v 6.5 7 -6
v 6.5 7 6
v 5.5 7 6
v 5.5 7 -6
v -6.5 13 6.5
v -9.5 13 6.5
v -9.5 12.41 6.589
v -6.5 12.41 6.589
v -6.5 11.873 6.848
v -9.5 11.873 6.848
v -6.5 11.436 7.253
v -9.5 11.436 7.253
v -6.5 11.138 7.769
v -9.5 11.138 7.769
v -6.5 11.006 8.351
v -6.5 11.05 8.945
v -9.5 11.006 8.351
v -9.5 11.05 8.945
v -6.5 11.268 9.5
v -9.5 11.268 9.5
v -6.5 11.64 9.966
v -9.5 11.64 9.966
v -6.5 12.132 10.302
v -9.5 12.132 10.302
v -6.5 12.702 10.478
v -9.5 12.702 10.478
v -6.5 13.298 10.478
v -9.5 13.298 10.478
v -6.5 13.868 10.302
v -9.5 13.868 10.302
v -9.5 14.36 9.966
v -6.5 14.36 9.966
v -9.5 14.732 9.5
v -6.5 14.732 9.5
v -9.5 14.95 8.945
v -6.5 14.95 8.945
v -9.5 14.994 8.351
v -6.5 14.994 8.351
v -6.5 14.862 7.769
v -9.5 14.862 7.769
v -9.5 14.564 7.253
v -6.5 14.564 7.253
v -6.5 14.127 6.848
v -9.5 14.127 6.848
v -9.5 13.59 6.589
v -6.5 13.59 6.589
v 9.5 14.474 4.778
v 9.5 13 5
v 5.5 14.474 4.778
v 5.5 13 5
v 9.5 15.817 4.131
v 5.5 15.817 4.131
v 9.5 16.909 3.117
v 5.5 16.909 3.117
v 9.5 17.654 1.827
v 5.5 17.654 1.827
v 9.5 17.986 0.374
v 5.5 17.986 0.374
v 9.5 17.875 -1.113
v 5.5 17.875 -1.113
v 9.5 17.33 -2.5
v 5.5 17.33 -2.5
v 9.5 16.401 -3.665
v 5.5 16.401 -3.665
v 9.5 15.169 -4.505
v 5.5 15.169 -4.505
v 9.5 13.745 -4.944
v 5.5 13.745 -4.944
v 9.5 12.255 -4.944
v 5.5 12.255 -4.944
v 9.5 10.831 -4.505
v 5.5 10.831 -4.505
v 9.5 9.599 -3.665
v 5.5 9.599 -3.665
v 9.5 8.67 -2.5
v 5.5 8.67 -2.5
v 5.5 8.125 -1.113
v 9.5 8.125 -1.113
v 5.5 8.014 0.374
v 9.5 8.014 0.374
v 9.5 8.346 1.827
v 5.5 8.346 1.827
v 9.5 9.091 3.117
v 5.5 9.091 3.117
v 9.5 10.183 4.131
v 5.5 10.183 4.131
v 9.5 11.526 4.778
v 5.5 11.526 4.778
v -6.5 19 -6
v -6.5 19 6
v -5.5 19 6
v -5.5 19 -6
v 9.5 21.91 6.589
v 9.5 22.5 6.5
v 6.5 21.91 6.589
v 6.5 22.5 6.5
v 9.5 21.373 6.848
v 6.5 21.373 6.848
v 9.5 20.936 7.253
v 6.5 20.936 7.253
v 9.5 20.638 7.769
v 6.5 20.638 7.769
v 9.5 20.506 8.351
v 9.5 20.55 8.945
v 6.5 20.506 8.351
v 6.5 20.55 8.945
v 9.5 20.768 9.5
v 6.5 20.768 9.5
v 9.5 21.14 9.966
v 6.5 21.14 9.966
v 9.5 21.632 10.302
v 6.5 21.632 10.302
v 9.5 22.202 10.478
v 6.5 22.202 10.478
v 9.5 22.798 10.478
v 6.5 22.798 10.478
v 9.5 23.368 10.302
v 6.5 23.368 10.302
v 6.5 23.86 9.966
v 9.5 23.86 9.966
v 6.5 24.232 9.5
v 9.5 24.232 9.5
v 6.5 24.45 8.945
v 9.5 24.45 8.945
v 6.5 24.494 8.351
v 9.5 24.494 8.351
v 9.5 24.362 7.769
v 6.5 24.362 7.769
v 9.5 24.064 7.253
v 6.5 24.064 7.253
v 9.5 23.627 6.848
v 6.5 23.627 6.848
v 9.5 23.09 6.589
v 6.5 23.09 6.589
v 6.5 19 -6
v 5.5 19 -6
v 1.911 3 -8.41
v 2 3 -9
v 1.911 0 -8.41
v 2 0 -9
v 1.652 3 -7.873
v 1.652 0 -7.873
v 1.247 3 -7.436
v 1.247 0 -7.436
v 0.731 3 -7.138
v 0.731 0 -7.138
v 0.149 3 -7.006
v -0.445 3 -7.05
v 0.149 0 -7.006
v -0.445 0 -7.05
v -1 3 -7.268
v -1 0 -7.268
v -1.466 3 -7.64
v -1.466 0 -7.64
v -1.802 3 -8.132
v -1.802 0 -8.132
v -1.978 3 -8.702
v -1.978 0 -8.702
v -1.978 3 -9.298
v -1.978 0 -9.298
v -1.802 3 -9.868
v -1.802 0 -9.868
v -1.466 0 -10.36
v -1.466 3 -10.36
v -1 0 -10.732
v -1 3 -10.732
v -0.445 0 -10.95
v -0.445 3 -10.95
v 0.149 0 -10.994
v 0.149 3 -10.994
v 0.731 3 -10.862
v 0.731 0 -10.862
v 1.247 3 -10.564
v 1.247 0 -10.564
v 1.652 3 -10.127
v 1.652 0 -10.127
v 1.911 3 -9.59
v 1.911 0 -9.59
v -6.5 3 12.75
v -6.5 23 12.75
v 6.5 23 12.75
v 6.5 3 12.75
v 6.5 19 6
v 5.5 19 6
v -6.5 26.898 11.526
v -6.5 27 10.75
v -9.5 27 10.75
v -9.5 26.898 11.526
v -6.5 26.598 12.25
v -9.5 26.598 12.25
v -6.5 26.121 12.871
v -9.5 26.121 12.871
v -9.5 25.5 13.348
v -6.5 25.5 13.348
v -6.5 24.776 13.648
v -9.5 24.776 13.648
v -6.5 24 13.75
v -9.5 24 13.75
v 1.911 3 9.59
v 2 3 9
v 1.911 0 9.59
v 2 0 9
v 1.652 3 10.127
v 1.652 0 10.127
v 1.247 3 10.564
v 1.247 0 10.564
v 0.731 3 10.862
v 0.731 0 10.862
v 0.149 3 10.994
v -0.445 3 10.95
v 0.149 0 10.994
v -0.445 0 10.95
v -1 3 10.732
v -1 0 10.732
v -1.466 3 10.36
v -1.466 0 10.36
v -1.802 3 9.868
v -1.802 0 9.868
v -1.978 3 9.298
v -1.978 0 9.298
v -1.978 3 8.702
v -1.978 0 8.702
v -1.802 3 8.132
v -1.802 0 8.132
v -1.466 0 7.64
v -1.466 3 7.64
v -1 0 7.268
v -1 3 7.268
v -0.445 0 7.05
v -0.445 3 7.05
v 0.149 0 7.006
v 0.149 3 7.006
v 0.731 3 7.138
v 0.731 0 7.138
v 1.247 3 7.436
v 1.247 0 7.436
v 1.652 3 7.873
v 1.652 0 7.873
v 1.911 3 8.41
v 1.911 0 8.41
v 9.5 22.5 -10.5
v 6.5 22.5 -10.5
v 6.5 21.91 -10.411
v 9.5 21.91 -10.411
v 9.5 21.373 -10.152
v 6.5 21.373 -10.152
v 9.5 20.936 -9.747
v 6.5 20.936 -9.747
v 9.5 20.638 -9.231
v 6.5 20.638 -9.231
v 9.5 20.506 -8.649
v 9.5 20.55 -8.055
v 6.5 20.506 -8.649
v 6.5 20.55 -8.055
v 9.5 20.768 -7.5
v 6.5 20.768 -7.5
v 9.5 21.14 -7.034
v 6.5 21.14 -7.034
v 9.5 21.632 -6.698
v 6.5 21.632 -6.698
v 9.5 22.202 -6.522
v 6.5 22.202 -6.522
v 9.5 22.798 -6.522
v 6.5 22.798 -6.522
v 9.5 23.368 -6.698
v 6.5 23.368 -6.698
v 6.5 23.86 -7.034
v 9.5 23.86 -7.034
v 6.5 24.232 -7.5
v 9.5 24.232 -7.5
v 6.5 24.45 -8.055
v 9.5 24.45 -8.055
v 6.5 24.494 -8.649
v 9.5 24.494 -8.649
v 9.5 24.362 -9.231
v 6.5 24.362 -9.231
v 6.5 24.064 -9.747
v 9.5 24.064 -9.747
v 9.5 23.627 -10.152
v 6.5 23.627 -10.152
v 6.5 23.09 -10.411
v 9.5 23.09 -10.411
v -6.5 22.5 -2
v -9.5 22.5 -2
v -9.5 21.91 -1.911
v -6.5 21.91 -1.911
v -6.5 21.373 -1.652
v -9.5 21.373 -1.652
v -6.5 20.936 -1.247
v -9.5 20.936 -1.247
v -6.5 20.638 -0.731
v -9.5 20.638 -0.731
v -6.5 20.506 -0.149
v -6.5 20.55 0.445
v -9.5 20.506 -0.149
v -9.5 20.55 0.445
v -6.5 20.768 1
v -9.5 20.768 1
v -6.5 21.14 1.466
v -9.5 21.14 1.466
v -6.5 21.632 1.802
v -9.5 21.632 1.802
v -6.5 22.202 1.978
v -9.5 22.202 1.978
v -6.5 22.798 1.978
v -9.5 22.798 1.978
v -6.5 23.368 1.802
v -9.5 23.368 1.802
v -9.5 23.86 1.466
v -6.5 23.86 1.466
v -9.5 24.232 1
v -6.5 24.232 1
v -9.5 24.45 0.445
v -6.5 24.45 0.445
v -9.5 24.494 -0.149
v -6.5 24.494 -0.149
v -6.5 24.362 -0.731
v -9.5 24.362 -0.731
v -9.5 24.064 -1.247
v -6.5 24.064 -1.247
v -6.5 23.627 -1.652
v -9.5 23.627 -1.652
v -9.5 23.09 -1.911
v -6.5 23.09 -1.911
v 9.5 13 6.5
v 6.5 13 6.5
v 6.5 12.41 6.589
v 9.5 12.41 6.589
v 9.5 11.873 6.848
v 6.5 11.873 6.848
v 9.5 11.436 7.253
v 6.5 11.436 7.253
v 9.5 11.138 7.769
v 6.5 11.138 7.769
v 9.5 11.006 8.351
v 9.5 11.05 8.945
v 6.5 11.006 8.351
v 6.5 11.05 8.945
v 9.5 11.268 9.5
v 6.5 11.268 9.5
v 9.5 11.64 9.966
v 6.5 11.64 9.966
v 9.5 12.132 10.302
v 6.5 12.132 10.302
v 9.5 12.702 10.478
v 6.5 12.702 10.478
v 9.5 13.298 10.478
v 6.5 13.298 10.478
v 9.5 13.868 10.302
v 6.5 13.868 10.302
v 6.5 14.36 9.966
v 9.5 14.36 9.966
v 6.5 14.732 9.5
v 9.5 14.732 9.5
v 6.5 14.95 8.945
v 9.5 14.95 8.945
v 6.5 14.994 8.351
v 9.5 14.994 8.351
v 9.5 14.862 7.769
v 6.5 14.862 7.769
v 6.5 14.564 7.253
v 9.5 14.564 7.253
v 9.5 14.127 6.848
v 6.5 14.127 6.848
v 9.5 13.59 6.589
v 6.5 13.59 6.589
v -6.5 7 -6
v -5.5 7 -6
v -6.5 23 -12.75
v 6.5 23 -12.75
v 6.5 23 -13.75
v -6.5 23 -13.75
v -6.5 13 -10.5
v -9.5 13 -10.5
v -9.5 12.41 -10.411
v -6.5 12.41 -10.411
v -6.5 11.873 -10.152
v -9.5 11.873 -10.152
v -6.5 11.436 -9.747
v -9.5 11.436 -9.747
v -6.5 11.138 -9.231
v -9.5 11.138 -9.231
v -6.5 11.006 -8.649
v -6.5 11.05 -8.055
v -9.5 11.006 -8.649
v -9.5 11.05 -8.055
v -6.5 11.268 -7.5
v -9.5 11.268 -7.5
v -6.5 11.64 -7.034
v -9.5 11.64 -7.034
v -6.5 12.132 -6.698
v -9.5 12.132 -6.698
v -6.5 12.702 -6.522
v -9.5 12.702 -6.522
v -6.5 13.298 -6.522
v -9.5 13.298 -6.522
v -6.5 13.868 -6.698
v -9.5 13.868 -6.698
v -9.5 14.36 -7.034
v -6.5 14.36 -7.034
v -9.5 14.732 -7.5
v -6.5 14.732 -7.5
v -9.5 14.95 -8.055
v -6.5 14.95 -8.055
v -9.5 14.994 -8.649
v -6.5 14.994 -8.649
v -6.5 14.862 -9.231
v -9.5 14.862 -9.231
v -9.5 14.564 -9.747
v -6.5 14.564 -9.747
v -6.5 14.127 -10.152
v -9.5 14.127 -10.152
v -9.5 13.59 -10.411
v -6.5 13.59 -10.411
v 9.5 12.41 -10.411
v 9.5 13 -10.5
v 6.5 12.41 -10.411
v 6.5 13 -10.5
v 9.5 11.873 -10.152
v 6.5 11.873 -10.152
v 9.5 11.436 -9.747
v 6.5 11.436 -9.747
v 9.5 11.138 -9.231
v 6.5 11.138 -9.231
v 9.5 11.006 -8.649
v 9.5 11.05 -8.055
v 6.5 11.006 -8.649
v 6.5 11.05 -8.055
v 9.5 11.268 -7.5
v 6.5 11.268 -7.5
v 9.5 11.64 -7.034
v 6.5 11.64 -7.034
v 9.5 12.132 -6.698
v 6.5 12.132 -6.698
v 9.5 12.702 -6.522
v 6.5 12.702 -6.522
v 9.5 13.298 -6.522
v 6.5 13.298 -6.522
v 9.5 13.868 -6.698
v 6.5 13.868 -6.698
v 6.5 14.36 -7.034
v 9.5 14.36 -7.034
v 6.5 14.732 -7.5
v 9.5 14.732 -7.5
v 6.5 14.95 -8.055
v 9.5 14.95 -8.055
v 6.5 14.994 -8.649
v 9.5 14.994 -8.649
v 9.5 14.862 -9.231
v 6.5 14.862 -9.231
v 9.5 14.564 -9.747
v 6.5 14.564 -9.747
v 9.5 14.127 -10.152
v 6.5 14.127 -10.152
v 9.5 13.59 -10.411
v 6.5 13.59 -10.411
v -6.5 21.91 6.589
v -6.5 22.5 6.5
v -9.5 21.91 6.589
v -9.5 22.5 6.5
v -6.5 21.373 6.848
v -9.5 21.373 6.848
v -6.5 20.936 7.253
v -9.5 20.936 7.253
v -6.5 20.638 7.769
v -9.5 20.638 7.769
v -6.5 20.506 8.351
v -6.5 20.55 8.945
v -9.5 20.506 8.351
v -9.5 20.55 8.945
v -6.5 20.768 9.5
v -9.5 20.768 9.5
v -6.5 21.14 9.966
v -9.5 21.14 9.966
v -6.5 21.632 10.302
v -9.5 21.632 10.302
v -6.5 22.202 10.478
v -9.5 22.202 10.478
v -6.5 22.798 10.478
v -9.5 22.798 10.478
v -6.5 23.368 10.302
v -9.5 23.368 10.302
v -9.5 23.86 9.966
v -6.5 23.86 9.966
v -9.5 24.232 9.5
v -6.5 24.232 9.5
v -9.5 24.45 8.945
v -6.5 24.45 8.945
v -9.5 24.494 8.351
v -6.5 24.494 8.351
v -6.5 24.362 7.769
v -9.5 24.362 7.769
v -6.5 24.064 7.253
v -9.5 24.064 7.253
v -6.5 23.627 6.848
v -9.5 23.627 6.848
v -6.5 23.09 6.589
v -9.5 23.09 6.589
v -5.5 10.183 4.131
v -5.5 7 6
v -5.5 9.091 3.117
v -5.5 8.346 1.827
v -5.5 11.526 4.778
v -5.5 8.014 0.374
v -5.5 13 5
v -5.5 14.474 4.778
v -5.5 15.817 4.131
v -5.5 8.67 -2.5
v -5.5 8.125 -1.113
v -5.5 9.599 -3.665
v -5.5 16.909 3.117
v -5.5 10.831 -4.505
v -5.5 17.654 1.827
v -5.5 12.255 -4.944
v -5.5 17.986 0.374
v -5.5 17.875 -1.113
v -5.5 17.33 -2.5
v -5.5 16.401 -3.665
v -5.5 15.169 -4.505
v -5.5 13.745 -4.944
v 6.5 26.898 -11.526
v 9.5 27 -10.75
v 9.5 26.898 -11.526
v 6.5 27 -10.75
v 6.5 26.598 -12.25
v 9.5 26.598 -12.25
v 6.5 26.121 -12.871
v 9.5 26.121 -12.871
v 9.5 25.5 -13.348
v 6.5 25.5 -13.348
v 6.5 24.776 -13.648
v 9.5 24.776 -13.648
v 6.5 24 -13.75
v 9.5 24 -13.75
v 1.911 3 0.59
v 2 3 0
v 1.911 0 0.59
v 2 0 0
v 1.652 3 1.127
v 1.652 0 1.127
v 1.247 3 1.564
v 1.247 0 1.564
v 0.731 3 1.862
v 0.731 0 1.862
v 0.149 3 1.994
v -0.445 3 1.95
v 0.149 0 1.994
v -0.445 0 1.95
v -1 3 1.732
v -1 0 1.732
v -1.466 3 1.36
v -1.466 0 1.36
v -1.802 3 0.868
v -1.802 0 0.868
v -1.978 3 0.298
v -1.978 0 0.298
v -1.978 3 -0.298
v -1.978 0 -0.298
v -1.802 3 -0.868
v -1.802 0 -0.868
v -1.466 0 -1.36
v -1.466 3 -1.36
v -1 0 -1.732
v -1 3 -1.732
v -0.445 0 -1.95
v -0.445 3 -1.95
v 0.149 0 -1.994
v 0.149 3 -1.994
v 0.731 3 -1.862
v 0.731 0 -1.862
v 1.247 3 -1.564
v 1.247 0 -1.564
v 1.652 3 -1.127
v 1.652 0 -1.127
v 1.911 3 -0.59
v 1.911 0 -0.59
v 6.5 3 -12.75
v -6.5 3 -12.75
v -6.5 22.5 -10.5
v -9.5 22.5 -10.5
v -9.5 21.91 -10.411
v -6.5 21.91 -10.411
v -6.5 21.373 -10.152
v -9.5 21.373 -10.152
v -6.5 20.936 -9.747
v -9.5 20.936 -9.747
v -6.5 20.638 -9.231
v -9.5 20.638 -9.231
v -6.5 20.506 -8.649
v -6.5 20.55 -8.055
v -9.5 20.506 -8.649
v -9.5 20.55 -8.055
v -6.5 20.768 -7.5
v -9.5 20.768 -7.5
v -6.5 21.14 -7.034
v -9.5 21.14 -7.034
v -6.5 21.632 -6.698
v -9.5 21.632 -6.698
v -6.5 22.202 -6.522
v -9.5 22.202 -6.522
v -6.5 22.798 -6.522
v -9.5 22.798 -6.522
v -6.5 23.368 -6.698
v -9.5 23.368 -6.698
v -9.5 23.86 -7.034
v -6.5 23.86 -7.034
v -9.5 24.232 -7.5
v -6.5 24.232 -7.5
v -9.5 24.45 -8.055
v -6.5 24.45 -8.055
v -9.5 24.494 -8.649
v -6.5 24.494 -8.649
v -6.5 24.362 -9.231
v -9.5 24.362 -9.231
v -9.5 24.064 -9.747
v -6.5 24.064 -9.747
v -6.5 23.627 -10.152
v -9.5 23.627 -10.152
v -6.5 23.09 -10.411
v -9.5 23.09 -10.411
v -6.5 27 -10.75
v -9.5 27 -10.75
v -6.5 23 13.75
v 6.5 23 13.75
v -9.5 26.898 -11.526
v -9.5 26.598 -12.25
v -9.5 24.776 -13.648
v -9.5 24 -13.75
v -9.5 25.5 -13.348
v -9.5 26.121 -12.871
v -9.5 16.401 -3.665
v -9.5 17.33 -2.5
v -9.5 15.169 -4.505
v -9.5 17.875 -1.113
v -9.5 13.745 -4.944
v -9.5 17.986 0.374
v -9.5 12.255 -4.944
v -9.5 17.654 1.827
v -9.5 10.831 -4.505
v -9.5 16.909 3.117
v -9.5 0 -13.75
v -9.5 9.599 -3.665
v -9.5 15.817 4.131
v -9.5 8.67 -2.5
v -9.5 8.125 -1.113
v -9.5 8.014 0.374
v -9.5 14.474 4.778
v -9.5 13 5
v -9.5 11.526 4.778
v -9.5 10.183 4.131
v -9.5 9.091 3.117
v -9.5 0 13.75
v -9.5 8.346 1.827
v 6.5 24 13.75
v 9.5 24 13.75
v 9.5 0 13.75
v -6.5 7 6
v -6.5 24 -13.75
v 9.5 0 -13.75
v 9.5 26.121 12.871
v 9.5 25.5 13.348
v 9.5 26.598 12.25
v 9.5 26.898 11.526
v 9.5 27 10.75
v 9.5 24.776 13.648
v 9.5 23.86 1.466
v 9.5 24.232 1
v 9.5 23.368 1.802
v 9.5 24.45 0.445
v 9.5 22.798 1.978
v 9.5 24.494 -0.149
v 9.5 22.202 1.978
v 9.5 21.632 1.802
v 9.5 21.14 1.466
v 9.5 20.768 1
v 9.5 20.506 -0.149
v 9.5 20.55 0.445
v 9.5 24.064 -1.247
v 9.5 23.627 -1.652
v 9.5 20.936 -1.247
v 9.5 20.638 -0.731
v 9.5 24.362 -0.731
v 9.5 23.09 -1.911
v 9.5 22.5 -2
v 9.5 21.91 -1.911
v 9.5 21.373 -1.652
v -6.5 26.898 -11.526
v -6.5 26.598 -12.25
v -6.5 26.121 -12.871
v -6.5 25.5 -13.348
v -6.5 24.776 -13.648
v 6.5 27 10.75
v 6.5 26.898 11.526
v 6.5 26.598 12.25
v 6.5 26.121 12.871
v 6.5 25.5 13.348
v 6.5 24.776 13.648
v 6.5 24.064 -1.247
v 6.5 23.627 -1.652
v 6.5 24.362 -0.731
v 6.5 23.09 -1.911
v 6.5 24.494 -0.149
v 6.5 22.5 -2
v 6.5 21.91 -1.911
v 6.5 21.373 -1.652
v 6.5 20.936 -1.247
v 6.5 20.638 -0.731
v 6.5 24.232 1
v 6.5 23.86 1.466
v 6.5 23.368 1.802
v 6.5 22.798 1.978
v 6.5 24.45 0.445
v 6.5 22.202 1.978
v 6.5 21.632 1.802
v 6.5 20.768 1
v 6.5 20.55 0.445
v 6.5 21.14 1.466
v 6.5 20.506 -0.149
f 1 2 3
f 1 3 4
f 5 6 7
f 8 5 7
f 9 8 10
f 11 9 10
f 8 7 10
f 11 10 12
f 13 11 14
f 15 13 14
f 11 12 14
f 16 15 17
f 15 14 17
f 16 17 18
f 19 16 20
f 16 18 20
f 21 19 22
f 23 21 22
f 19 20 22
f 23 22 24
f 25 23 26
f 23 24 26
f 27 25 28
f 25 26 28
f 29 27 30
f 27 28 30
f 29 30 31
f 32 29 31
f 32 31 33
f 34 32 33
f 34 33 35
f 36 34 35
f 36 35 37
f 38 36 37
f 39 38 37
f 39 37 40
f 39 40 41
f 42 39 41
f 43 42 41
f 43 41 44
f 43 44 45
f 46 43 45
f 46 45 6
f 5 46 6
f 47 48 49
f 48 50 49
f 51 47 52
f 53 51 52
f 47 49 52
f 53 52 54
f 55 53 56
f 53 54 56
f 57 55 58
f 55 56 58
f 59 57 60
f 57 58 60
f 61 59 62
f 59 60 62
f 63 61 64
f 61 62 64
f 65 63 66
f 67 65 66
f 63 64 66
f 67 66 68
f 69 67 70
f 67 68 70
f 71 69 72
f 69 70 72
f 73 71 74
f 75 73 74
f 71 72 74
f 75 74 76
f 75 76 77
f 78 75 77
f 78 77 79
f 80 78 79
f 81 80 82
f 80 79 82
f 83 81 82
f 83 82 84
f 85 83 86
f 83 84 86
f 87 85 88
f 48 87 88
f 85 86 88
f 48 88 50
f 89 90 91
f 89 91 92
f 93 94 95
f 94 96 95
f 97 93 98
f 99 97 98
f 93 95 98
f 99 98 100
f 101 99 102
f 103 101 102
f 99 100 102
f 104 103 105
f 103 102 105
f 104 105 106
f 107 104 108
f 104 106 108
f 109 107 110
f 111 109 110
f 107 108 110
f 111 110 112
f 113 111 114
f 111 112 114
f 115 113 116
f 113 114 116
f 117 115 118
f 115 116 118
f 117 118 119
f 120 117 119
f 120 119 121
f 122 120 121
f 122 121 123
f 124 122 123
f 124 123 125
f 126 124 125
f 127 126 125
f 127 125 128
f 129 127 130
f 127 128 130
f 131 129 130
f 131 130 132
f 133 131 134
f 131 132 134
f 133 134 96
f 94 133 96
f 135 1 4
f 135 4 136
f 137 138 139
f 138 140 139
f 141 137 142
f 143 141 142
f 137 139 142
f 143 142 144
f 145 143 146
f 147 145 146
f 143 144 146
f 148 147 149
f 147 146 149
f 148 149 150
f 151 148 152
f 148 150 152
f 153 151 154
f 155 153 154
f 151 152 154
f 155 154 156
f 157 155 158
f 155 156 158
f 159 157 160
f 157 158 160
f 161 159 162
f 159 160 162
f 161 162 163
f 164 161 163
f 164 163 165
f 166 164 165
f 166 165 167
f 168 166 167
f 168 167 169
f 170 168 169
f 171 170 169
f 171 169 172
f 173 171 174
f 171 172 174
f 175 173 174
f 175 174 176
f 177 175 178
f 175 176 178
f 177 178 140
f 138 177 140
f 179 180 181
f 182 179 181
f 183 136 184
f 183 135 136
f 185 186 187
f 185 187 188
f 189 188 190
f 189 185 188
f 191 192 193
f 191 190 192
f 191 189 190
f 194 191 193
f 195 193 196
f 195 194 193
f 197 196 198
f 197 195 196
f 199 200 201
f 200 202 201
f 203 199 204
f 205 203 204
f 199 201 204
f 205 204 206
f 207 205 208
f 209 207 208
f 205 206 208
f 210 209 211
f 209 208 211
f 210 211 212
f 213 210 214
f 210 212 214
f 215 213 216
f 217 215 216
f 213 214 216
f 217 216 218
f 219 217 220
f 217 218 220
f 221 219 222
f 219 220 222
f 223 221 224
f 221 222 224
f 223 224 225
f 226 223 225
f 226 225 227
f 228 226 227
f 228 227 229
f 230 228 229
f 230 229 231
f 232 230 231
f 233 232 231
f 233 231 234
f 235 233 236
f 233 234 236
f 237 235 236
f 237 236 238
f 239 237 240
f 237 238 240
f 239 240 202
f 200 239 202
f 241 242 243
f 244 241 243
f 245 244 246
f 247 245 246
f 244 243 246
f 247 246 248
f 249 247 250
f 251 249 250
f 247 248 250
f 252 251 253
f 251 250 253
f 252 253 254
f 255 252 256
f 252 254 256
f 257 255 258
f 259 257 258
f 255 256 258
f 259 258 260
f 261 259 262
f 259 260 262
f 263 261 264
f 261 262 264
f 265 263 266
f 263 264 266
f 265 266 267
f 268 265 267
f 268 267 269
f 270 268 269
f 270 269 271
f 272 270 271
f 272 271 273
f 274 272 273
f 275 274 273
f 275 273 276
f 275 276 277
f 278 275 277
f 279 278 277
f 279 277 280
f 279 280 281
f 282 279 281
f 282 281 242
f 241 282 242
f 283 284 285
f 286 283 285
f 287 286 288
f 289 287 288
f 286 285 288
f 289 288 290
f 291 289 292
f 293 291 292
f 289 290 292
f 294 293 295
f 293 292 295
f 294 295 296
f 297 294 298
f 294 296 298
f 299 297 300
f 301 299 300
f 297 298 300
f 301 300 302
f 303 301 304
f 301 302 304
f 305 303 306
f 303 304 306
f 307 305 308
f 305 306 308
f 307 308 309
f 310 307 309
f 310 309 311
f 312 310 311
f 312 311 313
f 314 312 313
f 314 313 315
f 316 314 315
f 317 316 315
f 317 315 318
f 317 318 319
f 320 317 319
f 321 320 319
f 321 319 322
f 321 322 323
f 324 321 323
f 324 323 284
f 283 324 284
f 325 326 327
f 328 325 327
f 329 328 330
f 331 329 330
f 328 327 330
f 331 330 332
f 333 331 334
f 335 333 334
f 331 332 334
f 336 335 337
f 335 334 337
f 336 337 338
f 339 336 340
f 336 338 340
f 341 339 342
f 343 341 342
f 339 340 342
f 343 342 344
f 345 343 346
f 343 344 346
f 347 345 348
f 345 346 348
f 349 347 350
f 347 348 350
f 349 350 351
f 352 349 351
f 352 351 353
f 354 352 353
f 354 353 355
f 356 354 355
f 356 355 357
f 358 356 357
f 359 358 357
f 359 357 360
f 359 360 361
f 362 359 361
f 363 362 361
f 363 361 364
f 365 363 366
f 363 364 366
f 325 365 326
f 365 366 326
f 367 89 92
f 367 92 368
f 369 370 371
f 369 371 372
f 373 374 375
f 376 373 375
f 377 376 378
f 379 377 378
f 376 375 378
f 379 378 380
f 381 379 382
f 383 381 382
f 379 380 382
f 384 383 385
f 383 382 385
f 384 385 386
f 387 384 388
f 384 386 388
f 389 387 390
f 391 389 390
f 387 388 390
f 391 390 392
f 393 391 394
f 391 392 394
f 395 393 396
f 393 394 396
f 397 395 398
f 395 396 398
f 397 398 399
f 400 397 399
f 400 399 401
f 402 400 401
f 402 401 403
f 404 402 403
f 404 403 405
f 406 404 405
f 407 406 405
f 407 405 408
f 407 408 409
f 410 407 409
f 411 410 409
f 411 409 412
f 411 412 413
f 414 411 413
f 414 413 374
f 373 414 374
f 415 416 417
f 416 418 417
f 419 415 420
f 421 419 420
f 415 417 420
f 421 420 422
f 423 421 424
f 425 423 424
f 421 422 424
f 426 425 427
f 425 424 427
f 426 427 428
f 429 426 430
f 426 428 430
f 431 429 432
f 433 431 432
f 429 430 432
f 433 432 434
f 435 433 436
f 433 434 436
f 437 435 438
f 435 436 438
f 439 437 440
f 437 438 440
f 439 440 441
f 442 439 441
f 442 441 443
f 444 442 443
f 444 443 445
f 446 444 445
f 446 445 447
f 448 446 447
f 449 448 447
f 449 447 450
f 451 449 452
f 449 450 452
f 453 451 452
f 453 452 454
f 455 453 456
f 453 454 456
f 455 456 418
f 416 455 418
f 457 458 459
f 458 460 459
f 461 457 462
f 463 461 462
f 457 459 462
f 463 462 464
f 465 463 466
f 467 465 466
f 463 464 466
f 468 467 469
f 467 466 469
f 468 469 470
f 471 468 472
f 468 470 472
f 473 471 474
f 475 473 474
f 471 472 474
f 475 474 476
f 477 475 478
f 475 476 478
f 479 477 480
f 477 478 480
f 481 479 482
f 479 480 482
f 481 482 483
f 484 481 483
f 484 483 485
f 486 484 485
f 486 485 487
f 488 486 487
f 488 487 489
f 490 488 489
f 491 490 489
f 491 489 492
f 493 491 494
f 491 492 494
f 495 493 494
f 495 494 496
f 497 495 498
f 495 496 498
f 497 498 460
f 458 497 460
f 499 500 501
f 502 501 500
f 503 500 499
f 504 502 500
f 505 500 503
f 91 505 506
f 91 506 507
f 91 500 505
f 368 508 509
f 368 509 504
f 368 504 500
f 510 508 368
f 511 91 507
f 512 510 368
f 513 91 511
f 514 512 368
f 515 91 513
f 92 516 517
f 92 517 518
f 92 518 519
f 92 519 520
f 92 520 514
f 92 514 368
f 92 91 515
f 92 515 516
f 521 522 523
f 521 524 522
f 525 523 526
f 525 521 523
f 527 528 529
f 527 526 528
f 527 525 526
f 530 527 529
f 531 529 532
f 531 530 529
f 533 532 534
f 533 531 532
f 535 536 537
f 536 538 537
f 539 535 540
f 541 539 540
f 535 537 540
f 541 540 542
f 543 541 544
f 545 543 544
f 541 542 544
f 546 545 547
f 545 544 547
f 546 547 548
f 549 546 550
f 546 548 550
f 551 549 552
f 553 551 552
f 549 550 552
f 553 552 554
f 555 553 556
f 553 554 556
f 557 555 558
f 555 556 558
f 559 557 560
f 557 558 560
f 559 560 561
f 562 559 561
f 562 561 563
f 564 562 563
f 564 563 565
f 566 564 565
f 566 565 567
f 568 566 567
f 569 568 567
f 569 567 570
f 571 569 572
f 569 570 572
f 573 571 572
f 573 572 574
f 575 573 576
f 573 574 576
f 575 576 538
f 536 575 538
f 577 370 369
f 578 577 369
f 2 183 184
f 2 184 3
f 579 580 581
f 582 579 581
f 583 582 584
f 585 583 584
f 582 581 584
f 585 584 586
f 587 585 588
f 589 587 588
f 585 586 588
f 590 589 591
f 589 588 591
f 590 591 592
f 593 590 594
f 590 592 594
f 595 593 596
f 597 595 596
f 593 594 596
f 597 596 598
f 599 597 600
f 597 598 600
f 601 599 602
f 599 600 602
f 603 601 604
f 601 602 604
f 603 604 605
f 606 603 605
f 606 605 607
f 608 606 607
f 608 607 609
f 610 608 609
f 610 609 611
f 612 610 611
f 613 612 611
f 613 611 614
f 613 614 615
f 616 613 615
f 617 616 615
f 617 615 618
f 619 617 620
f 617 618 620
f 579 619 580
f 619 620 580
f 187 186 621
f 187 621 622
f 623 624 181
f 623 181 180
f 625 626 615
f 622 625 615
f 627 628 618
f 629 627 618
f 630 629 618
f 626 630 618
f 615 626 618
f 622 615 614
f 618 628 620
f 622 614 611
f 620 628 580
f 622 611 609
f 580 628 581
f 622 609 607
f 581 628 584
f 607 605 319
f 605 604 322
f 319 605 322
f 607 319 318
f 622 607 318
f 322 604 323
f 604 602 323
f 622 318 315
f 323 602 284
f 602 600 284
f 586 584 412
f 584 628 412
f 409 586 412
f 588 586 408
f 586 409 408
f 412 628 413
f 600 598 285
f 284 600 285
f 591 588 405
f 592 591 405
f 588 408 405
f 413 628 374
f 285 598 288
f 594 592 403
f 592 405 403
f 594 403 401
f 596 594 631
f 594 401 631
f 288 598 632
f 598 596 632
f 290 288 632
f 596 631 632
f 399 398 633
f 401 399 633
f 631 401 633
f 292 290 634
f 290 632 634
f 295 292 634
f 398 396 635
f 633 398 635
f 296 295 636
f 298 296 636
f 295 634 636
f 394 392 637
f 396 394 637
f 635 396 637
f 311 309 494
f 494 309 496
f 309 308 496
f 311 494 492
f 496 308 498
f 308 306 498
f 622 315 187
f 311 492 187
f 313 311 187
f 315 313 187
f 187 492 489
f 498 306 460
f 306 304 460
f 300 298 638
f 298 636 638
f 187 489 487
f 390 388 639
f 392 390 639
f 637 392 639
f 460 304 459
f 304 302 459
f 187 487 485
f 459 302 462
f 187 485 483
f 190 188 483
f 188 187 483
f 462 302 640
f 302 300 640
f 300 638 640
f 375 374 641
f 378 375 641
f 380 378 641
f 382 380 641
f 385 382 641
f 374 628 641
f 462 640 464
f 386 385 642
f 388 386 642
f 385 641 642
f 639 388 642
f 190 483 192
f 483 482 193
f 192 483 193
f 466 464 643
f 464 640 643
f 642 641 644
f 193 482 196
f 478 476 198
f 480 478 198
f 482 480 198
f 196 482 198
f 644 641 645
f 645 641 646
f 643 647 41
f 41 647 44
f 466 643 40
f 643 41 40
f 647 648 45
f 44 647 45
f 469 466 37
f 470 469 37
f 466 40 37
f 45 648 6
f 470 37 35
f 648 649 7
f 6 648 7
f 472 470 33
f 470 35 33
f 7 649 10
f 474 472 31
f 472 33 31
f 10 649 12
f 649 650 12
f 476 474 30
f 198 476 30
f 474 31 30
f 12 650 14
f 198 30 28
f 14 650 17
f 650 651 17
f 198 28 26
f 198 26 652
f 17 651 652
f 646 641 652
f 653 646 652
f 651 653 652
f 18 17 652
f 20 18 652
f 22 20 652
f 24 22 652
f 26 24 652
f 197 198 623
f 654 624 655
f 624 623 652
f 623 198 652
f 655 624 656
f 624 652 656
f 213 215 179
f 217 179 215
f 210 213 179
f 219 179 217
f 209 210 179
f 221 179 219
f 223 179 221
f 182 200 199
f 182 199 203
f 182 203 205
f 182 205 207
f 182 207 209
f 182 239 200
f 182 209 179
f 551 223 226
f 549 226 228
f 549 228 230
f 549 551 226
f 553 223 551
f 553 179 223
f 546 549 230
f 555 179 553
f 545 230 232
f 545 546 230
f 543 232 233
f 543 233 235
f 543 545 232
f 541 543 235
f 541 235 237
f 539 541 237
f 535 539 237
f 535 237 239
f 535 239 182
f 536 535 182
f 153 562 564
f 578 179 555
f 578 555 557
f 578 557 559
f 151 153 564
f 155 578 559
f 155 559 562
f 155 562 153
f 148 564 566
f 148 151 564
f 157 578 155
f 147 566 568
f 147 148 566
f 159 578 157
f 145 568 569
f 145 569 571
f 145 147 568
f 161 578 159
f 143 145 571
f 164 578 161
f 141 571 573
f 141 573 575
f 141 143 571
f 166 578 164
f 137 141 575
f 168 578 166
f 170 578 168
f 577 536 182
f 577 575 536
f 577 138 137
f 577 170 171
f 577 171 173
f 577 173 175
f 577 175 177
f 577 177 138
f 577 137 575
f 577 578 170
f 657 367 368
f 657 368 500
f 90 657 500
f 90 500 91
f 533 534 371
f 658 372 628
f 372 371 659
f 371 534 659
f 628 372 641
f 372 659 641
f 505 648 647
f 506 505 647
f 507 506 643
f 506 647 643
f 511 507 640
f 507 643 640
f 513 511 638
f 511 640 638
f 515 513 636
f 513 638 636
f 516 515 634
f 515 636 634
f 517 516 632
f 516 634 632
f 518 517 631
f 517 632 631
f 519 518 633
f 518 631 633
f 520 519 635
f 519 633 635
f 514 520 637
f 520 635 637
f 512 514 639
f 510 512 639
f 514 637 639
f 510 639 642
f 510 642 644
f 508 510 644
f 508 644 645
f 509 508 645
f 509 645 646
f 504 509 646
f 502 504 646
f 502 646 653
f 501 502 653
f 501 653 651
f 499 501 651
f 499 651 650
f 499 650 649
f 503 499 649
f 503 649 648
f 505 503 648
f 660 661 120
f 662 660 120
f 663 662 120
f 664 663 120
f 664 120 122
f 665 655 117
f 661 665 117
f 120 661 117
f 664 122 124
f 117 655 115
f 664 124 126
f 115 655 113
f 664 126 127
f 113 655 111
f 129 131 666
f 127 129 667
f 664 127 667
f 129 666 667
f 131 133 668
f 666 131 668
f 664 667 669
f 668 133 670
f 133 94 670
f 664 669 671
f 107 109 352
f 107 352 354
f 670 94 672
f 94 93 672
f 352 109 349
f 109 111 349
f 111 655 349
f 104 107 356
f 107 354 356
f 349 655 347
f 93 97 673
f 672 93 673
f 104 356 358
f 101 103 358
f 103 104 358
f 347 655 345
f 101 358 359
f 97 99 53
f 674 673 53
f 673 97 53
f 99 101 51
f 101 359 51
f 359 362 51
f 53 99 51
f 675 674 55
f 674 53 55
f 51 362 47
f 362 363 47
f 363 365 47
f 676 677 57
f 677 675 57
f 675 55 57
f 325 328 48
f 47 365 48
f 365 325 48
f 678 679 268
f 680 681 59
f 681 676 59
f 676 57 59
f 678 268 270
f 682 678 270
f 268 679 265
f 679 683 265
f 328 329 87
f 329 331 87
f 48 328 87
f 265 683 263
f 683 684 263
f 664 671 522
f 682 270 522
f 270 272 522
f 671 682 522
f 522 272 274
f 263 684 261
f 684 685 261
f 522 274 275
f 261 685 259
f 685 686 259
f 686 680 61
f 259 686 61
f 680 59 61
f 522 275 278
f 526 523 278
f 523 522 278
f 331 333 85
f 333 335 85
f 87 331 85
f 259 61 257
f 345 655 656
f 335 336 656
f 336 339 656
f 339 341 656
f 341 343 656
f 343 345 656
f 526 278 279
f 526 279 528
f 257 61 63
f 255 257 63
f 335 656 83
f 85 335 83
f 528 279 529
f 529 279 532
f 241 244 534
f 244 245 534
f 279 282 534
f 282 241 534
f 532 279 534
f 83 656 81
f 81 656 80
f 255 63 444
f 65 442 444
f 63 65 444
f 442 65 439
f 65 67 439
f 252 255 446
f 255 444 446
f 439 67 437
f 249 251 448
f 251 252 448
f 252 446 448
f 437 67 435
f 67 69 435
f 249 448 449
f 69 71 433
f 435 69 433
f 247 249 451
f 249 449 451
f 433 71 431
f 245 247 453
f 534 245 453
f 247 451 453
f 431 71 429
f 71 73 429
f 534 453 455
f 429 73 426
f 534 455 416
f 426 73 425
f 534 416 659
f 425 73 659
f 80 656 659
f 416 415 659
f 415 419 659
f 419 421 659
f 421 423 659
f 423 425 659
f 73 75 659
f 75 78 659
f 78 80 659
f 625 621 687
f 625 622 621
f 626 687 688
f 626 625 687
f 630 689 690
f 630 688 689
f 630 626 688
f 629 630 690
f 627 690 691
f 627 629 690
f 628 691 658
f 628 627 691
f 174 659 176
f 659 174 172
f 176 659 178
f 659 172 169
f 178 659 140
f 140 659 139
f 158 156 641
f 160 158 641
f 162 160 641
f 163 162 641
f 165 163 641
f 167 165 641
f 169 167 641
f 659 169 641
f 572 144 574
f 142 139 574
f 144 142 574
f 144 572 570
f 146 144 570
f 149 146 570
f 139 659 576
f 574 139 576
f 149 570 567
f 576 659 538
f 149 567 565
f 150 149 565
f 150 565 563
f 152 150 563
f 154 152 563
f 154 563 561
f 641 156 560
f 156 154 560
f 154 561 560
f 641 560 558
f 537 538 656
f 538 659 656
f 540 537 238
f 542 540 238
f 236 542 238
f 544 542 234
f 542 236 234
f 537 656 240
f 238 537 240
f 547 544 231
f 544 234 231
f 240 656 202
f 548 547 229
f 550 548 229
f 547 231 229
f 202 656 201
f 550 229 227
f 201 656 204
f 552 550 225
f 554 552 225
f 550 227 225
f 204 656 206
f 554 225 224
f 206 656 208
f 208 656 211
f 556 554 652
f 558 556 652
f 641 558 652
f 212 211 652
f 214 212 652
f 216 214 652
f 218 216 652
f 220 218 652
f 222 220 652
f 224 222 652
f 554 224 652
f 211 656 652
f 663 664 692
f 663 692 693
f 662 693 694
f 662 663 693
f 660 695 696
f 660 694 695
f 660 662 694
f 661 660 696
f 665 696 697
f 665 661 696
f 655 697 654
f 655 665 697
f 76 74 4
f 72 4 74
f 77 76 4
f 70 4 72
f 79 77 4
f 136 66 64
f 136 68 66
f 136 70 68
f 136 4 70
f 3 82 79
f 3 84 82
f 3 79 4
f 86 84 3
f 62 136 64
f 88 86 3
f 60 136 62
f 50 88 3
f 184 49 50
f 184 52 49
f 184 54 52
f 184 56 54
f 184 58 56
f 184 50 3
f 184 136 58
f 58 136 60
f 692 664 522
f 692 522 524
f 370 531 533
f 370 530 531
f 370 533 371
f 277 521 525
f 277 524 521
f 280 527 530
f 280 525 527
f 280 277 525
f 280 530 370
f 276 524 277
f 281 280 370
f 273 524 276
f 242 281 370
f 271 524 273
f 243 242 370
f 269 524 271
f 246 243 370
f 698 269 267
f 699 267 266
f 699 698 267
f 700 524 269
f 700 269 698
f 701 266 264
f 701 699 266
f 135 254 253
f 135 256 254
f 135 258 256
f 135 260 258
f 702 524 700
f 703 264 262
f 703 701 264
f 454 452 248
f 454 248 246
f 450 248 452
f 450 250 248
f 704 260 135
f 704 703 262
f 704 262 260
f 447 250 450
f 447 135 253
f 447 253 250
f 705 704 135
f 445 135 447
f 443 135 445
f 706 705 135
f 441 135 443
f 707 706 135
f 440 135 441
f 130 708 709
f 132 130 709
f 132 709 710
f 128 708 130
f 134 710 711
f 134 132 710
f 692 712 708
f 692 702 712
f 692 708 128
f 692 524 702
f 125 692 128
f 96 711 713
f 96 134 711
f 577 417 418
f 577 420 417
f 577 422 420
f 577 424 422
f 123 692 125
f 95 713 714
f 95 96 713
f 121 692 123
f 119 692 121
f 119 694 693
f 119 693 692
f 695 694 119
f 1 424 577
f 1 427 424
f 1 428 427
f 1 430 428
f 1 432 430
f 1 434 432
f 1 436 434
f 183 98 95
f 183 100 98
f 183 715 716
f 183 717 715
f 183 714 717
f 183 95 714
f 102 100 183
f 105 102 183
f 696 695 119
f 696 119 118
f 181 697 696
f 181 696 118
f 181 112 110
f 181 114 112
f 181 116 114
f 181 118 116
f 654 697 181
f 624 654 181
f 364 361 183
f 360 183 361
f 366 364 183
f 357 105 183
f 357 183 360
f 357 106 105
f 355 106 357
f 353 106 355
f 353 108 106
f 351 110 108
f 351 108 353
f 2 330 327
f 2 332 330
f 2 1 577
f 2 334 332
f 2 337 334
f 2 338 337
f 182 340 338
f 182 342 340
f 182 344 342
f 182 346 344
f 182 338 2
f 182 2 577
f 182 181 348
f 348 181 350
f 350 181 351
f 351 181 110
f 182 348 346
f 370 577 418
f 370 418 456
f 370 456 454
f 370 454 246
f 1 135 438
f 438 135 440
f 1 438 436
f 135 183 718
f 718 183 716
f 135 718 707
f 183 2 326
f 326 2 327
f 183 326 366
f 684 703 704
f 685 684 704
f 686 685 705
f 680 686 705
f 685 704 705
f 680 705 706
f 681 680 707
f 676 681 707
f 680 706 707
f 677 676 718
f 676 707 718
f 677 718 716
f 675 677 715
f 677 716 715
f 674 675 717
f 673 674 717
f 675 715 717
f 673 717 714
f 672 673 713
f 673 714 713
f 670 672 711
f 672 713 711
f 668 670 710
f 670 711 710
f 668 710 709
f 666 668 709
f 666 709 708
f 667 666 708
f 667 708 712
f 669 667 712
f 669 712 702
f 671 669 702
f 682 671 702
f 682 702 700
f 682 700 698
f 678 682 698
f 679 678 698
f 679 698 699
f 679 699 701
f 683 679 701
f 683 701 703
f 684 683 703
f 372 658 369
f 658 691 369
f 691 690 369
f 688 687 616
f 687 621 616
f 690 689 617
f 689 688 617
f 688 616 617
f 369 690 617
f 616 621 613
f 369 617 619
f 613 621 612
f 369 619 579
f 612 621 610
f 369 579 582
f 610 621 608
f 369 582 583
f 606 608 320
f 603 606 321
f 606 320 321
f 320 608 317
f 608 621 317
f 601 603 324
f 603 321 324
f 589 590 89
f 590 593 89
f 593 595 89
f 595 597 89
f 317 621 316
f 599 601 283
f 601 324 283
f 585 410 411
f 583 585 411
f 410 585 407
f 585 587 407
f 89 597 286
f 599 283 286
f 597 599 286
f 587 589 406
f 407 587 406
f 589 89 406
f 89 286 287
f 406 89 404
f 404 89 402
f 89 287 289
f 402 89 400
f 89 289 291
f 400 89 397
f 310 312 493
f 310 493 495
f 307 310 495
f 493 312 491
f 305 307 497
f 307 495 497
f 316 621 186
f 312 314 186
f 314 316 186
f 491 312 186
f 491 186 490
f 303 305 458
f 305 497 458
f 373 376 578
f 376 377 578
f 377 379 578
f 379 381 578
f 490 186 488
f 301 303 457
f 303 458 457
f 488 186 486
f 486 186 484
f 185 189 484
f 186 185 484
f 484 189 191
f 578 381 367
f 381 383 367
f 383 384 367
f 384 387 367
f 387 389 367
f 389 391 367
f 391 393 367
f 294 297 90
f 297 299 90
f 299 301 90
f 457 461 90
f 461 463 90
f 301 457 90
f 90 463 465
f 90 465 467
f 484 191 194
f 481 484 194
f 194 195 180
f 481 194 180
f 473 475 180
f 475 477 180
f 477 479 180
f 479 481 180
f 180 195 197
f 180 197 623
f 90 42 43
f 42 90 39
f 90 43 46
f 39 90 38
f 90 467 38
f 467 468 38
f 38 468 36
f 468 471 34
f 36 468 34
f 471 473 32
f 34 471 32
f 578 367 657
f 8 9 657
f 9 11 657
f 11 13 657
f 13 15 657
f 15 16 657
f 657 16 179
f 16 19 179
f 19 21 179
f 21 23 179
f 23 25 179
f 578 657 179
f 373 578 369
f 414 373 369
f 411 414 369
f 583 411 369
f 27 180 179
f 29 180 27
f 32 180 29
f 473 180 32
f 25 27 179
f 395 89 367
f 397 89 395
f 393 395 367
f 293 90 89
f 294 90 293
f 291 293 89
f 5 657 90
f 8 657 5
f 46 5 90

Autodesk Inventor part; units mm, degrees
ref_plane "YZ Plane" through (0, 0, 0) normal (1, 0, 0) x (0, 1, 0)
ref_plane "XZ Plane" through (0, 0, 0) normal (0, 1, 0) x (-1, 0, 0)
ref_plane "XY Plane" through (0, 0, 0) normal (0, 0, 1) x (1, 0, 0)
sketch "Sketch1" plane through (0, 0, 0) normal (0, 1, 0) x (-1, 0, 0)
  line L0 (9.5, 13.75) -> (-9.5, 13.75)
  line L1 (-9.5, 13.75) -> (-9.5, -13.75)
  line L2 (-9.5, -13.75) -> (9.5, -13.75)
  line L3 (9.5, -13.75) -> (9.5, 13.75)
  point P0 (0, 0)
  dimension "d0" = 19
  dimension "d1" = 27.5
  dimension "d2" = 13.75
  dimension "d3" = 9.5
extrude "Extrusion1" add sketch "Sketch1" along normal blind 27
sketch "Sketch2" plane through (0, 27, 0) normal (0, 1, 0) x (1, 0, 0)
  line L0 (9.5, 13.75) -> (-9.5, 13.75) projected
  line L1 (9.5, -13.75) -> (9.5, 13.75) projected
  line L2 (-9.5, -13.75) -> (9.5, -13.75) projected
  line L3 (-9.5, 13.75) -> (-9.5, -13.75) projected
  line L4 (-6.5, -12.75) -> (6.5, -12.75)
  line L5 (6.5, -12.75) -> (6.5, 12.75)
  line L6 (6.5, 12.75) -> (-6.5, 12.75)
  line L7 (-6.5, 12.75) -> (-6.5, -12.75)
  point P0 (0, 0)
  dimension "d6" = 3
  dimension "d7" = 3
  dimension "d8" = 1
  dimension "d9" = 1
extrude "Extrusion2" cut sketch "Sketch2" against normal blind 24 contours L7 L6 L5 L4
sketch "Sketch3" plane through (-9.5, 0, 13.75) normal (0, 0, 1) x (1, 0, 0)
  line L0 (0, 27) -> (19, 27) projected
  line L1 (3, 27) -> (3, 3) projected
  line L2 (16, 27) -> (16, 3) projected
  line L3 (3, 27) -> (3, 3) projected
  line L4 (16, 27) -> (16, 3) projected
  line L5 (3, 27) -> (16, 27)
  line L6 (16, 27) -> (16, 23)
  line L7 (16, 23) -> (3, 23)
  line L8 (3, 23) -> (3, 27)
  point P0 (9.5, 0)
  point P1 (3, 23)
  dimension "d12" = 4
extrude "Extrusion3" cut sketch "Sketch3" against normal blind 30
fillet "Fillet1" radius 3 4 edges at (-8, 27, 13.75) (-8, 27, -13.75) (8, 27, -13.75) (8, 27, 13.75)
sketch "Sketch4" plane through (0, 0, 0) normal (0, -1, 0) x (1, 0, 0)
  circle A0 centre (0, 0) radius 2
  circle A1 centre (0, -9) radius 2
  circle A2 centre (0, 9) radius 2
  dimension "d16" = 4
  dimension "d17" = 4
  dimension "d18" = 4
  dimension "d19" = 9
  dimension "d20" = 9
extrude "Extrusion4" cut sketch "Sketch4" against normal blind 5
sketch "Sketch5" plane through (9.5, 0, 13.75) normal (1, 0, 0) x (0, 0, -1)
  line L0 (3, 27) -> (24.5, 27) projected
  line L1 (27.5, 0) -> (27.5, 24) projected
  line L2 (0, 0) -> (0, 24) projected
  circle A0 centre (13.75, 13) radius 2
  circle A1 centre (22.25, 13) radius 2
  circle A2 centre (5.25, 13) radius 2
  line L3 (1.7351, 17.75) -> (24.75, 17.75) construction
  circle A3 centre (13.75, 22.5) radius 2
  circle A4 centre (22.25, 22.5) radius 2
  circle A5 centre (5.25, 22.5) radius 2
  point P0 (13.75, 0)
  dimension "d23" = 14
  dimension "d24" = 27.5
  dimension "d25" = 13.75
  dimension "d26" = 4
  dimension "d27" = 0
  dimension "d28" = 0
  dimension "d29" = 4
  dimension "d30" = 4
  dimension "d31" = 8.5
  dimension "d32" = 8.5
  dimension "d35" = 4.75
hole "Hole1" at (9.5, 22.5, 8.5) at (9.5, 22.5, 0) at (9.5, 22.5, -8.5) at (9.5, 13, 0) at (9.5, 13, -8.5) at (9.5, 13, 8.5) direction (-1, 0, 0) diameter 4 end through all
sketch "Sketch6" plane through (-6.5, 3, 12.75) normal (1, 0, 0) x (0, 0, -1)
  circle A0 centre (12.75, 10) radius 2 projected
  line L0 (6.75, 16) -> (18.75, 16)
  line L1 (18.75, 16) -> (18.75, 4)
  line L2 (18.75, 4) -> (6.75, 4)
  line L3 (6.75, 4) -> (6.75, 16)
  point P0 (12.75, -3)
  dimension "d43" = 12
  dimension "d44" = 12
  dimension "d45" = 6
  dimension "d46" = 6
extrude "Extrusion5" add sketch "Sketch6" along normal blind 1
sketch "Sketch7" plane through (6.5, 3, -12.75) normal (-1, 0, 0) x (0, 0, 1)
  line L0 (6.75, 16) -> (18.75, 16) projected
  line L1 (6.75, 4) -> (6.75, 16) projected
  line L2 (18.75, 16) -> (18.75, 4) projected
  line L3 (18.75, 4) -> (6.75, 4) projected
  circle A0 centre (12.75, 10) radius 2 projected
  line L4 (18.75, 16) -> (6.75, 16)
  line L5 (6.75, 16) -> (6.75, 4)
  line L6 (6.75, 4) -> (18.75, 4)
  line L7 (18.75, 4) -> (18.75, 16)
  point P0 (12.75, -3)
extrude "Extrusion6" add sketch "Sketch7" along normal blind 1
sketch "Sketch8" plane through (-9.5, 0, -13.75) normal (-1, 0, 0) x (0, 0, 1)
  circle A0 centre (13.75, 13) radius 2 projected
  circle A1 centre (13.75, 13) radius 5
  point P0 (13.75, 0)
  dimension "d51" = 10
extrude "Extrusion7" cut sketch "Sketch8" against normal through all
equation "\"d2\" = 0.5 * d1"
equation "\"d3\" = 0.5 * d0"
equation "\"d16\" = d17"
equation "\"d18\" = d17"
equation "\"d20\" = d19"
equation "\"d25\" = 0.5 * d24"
equation "\"d29\" = d26"
equation "\"d30\" = d26"
properties part number "SoporteEncoder" material "Plastic, Opaque Black"
